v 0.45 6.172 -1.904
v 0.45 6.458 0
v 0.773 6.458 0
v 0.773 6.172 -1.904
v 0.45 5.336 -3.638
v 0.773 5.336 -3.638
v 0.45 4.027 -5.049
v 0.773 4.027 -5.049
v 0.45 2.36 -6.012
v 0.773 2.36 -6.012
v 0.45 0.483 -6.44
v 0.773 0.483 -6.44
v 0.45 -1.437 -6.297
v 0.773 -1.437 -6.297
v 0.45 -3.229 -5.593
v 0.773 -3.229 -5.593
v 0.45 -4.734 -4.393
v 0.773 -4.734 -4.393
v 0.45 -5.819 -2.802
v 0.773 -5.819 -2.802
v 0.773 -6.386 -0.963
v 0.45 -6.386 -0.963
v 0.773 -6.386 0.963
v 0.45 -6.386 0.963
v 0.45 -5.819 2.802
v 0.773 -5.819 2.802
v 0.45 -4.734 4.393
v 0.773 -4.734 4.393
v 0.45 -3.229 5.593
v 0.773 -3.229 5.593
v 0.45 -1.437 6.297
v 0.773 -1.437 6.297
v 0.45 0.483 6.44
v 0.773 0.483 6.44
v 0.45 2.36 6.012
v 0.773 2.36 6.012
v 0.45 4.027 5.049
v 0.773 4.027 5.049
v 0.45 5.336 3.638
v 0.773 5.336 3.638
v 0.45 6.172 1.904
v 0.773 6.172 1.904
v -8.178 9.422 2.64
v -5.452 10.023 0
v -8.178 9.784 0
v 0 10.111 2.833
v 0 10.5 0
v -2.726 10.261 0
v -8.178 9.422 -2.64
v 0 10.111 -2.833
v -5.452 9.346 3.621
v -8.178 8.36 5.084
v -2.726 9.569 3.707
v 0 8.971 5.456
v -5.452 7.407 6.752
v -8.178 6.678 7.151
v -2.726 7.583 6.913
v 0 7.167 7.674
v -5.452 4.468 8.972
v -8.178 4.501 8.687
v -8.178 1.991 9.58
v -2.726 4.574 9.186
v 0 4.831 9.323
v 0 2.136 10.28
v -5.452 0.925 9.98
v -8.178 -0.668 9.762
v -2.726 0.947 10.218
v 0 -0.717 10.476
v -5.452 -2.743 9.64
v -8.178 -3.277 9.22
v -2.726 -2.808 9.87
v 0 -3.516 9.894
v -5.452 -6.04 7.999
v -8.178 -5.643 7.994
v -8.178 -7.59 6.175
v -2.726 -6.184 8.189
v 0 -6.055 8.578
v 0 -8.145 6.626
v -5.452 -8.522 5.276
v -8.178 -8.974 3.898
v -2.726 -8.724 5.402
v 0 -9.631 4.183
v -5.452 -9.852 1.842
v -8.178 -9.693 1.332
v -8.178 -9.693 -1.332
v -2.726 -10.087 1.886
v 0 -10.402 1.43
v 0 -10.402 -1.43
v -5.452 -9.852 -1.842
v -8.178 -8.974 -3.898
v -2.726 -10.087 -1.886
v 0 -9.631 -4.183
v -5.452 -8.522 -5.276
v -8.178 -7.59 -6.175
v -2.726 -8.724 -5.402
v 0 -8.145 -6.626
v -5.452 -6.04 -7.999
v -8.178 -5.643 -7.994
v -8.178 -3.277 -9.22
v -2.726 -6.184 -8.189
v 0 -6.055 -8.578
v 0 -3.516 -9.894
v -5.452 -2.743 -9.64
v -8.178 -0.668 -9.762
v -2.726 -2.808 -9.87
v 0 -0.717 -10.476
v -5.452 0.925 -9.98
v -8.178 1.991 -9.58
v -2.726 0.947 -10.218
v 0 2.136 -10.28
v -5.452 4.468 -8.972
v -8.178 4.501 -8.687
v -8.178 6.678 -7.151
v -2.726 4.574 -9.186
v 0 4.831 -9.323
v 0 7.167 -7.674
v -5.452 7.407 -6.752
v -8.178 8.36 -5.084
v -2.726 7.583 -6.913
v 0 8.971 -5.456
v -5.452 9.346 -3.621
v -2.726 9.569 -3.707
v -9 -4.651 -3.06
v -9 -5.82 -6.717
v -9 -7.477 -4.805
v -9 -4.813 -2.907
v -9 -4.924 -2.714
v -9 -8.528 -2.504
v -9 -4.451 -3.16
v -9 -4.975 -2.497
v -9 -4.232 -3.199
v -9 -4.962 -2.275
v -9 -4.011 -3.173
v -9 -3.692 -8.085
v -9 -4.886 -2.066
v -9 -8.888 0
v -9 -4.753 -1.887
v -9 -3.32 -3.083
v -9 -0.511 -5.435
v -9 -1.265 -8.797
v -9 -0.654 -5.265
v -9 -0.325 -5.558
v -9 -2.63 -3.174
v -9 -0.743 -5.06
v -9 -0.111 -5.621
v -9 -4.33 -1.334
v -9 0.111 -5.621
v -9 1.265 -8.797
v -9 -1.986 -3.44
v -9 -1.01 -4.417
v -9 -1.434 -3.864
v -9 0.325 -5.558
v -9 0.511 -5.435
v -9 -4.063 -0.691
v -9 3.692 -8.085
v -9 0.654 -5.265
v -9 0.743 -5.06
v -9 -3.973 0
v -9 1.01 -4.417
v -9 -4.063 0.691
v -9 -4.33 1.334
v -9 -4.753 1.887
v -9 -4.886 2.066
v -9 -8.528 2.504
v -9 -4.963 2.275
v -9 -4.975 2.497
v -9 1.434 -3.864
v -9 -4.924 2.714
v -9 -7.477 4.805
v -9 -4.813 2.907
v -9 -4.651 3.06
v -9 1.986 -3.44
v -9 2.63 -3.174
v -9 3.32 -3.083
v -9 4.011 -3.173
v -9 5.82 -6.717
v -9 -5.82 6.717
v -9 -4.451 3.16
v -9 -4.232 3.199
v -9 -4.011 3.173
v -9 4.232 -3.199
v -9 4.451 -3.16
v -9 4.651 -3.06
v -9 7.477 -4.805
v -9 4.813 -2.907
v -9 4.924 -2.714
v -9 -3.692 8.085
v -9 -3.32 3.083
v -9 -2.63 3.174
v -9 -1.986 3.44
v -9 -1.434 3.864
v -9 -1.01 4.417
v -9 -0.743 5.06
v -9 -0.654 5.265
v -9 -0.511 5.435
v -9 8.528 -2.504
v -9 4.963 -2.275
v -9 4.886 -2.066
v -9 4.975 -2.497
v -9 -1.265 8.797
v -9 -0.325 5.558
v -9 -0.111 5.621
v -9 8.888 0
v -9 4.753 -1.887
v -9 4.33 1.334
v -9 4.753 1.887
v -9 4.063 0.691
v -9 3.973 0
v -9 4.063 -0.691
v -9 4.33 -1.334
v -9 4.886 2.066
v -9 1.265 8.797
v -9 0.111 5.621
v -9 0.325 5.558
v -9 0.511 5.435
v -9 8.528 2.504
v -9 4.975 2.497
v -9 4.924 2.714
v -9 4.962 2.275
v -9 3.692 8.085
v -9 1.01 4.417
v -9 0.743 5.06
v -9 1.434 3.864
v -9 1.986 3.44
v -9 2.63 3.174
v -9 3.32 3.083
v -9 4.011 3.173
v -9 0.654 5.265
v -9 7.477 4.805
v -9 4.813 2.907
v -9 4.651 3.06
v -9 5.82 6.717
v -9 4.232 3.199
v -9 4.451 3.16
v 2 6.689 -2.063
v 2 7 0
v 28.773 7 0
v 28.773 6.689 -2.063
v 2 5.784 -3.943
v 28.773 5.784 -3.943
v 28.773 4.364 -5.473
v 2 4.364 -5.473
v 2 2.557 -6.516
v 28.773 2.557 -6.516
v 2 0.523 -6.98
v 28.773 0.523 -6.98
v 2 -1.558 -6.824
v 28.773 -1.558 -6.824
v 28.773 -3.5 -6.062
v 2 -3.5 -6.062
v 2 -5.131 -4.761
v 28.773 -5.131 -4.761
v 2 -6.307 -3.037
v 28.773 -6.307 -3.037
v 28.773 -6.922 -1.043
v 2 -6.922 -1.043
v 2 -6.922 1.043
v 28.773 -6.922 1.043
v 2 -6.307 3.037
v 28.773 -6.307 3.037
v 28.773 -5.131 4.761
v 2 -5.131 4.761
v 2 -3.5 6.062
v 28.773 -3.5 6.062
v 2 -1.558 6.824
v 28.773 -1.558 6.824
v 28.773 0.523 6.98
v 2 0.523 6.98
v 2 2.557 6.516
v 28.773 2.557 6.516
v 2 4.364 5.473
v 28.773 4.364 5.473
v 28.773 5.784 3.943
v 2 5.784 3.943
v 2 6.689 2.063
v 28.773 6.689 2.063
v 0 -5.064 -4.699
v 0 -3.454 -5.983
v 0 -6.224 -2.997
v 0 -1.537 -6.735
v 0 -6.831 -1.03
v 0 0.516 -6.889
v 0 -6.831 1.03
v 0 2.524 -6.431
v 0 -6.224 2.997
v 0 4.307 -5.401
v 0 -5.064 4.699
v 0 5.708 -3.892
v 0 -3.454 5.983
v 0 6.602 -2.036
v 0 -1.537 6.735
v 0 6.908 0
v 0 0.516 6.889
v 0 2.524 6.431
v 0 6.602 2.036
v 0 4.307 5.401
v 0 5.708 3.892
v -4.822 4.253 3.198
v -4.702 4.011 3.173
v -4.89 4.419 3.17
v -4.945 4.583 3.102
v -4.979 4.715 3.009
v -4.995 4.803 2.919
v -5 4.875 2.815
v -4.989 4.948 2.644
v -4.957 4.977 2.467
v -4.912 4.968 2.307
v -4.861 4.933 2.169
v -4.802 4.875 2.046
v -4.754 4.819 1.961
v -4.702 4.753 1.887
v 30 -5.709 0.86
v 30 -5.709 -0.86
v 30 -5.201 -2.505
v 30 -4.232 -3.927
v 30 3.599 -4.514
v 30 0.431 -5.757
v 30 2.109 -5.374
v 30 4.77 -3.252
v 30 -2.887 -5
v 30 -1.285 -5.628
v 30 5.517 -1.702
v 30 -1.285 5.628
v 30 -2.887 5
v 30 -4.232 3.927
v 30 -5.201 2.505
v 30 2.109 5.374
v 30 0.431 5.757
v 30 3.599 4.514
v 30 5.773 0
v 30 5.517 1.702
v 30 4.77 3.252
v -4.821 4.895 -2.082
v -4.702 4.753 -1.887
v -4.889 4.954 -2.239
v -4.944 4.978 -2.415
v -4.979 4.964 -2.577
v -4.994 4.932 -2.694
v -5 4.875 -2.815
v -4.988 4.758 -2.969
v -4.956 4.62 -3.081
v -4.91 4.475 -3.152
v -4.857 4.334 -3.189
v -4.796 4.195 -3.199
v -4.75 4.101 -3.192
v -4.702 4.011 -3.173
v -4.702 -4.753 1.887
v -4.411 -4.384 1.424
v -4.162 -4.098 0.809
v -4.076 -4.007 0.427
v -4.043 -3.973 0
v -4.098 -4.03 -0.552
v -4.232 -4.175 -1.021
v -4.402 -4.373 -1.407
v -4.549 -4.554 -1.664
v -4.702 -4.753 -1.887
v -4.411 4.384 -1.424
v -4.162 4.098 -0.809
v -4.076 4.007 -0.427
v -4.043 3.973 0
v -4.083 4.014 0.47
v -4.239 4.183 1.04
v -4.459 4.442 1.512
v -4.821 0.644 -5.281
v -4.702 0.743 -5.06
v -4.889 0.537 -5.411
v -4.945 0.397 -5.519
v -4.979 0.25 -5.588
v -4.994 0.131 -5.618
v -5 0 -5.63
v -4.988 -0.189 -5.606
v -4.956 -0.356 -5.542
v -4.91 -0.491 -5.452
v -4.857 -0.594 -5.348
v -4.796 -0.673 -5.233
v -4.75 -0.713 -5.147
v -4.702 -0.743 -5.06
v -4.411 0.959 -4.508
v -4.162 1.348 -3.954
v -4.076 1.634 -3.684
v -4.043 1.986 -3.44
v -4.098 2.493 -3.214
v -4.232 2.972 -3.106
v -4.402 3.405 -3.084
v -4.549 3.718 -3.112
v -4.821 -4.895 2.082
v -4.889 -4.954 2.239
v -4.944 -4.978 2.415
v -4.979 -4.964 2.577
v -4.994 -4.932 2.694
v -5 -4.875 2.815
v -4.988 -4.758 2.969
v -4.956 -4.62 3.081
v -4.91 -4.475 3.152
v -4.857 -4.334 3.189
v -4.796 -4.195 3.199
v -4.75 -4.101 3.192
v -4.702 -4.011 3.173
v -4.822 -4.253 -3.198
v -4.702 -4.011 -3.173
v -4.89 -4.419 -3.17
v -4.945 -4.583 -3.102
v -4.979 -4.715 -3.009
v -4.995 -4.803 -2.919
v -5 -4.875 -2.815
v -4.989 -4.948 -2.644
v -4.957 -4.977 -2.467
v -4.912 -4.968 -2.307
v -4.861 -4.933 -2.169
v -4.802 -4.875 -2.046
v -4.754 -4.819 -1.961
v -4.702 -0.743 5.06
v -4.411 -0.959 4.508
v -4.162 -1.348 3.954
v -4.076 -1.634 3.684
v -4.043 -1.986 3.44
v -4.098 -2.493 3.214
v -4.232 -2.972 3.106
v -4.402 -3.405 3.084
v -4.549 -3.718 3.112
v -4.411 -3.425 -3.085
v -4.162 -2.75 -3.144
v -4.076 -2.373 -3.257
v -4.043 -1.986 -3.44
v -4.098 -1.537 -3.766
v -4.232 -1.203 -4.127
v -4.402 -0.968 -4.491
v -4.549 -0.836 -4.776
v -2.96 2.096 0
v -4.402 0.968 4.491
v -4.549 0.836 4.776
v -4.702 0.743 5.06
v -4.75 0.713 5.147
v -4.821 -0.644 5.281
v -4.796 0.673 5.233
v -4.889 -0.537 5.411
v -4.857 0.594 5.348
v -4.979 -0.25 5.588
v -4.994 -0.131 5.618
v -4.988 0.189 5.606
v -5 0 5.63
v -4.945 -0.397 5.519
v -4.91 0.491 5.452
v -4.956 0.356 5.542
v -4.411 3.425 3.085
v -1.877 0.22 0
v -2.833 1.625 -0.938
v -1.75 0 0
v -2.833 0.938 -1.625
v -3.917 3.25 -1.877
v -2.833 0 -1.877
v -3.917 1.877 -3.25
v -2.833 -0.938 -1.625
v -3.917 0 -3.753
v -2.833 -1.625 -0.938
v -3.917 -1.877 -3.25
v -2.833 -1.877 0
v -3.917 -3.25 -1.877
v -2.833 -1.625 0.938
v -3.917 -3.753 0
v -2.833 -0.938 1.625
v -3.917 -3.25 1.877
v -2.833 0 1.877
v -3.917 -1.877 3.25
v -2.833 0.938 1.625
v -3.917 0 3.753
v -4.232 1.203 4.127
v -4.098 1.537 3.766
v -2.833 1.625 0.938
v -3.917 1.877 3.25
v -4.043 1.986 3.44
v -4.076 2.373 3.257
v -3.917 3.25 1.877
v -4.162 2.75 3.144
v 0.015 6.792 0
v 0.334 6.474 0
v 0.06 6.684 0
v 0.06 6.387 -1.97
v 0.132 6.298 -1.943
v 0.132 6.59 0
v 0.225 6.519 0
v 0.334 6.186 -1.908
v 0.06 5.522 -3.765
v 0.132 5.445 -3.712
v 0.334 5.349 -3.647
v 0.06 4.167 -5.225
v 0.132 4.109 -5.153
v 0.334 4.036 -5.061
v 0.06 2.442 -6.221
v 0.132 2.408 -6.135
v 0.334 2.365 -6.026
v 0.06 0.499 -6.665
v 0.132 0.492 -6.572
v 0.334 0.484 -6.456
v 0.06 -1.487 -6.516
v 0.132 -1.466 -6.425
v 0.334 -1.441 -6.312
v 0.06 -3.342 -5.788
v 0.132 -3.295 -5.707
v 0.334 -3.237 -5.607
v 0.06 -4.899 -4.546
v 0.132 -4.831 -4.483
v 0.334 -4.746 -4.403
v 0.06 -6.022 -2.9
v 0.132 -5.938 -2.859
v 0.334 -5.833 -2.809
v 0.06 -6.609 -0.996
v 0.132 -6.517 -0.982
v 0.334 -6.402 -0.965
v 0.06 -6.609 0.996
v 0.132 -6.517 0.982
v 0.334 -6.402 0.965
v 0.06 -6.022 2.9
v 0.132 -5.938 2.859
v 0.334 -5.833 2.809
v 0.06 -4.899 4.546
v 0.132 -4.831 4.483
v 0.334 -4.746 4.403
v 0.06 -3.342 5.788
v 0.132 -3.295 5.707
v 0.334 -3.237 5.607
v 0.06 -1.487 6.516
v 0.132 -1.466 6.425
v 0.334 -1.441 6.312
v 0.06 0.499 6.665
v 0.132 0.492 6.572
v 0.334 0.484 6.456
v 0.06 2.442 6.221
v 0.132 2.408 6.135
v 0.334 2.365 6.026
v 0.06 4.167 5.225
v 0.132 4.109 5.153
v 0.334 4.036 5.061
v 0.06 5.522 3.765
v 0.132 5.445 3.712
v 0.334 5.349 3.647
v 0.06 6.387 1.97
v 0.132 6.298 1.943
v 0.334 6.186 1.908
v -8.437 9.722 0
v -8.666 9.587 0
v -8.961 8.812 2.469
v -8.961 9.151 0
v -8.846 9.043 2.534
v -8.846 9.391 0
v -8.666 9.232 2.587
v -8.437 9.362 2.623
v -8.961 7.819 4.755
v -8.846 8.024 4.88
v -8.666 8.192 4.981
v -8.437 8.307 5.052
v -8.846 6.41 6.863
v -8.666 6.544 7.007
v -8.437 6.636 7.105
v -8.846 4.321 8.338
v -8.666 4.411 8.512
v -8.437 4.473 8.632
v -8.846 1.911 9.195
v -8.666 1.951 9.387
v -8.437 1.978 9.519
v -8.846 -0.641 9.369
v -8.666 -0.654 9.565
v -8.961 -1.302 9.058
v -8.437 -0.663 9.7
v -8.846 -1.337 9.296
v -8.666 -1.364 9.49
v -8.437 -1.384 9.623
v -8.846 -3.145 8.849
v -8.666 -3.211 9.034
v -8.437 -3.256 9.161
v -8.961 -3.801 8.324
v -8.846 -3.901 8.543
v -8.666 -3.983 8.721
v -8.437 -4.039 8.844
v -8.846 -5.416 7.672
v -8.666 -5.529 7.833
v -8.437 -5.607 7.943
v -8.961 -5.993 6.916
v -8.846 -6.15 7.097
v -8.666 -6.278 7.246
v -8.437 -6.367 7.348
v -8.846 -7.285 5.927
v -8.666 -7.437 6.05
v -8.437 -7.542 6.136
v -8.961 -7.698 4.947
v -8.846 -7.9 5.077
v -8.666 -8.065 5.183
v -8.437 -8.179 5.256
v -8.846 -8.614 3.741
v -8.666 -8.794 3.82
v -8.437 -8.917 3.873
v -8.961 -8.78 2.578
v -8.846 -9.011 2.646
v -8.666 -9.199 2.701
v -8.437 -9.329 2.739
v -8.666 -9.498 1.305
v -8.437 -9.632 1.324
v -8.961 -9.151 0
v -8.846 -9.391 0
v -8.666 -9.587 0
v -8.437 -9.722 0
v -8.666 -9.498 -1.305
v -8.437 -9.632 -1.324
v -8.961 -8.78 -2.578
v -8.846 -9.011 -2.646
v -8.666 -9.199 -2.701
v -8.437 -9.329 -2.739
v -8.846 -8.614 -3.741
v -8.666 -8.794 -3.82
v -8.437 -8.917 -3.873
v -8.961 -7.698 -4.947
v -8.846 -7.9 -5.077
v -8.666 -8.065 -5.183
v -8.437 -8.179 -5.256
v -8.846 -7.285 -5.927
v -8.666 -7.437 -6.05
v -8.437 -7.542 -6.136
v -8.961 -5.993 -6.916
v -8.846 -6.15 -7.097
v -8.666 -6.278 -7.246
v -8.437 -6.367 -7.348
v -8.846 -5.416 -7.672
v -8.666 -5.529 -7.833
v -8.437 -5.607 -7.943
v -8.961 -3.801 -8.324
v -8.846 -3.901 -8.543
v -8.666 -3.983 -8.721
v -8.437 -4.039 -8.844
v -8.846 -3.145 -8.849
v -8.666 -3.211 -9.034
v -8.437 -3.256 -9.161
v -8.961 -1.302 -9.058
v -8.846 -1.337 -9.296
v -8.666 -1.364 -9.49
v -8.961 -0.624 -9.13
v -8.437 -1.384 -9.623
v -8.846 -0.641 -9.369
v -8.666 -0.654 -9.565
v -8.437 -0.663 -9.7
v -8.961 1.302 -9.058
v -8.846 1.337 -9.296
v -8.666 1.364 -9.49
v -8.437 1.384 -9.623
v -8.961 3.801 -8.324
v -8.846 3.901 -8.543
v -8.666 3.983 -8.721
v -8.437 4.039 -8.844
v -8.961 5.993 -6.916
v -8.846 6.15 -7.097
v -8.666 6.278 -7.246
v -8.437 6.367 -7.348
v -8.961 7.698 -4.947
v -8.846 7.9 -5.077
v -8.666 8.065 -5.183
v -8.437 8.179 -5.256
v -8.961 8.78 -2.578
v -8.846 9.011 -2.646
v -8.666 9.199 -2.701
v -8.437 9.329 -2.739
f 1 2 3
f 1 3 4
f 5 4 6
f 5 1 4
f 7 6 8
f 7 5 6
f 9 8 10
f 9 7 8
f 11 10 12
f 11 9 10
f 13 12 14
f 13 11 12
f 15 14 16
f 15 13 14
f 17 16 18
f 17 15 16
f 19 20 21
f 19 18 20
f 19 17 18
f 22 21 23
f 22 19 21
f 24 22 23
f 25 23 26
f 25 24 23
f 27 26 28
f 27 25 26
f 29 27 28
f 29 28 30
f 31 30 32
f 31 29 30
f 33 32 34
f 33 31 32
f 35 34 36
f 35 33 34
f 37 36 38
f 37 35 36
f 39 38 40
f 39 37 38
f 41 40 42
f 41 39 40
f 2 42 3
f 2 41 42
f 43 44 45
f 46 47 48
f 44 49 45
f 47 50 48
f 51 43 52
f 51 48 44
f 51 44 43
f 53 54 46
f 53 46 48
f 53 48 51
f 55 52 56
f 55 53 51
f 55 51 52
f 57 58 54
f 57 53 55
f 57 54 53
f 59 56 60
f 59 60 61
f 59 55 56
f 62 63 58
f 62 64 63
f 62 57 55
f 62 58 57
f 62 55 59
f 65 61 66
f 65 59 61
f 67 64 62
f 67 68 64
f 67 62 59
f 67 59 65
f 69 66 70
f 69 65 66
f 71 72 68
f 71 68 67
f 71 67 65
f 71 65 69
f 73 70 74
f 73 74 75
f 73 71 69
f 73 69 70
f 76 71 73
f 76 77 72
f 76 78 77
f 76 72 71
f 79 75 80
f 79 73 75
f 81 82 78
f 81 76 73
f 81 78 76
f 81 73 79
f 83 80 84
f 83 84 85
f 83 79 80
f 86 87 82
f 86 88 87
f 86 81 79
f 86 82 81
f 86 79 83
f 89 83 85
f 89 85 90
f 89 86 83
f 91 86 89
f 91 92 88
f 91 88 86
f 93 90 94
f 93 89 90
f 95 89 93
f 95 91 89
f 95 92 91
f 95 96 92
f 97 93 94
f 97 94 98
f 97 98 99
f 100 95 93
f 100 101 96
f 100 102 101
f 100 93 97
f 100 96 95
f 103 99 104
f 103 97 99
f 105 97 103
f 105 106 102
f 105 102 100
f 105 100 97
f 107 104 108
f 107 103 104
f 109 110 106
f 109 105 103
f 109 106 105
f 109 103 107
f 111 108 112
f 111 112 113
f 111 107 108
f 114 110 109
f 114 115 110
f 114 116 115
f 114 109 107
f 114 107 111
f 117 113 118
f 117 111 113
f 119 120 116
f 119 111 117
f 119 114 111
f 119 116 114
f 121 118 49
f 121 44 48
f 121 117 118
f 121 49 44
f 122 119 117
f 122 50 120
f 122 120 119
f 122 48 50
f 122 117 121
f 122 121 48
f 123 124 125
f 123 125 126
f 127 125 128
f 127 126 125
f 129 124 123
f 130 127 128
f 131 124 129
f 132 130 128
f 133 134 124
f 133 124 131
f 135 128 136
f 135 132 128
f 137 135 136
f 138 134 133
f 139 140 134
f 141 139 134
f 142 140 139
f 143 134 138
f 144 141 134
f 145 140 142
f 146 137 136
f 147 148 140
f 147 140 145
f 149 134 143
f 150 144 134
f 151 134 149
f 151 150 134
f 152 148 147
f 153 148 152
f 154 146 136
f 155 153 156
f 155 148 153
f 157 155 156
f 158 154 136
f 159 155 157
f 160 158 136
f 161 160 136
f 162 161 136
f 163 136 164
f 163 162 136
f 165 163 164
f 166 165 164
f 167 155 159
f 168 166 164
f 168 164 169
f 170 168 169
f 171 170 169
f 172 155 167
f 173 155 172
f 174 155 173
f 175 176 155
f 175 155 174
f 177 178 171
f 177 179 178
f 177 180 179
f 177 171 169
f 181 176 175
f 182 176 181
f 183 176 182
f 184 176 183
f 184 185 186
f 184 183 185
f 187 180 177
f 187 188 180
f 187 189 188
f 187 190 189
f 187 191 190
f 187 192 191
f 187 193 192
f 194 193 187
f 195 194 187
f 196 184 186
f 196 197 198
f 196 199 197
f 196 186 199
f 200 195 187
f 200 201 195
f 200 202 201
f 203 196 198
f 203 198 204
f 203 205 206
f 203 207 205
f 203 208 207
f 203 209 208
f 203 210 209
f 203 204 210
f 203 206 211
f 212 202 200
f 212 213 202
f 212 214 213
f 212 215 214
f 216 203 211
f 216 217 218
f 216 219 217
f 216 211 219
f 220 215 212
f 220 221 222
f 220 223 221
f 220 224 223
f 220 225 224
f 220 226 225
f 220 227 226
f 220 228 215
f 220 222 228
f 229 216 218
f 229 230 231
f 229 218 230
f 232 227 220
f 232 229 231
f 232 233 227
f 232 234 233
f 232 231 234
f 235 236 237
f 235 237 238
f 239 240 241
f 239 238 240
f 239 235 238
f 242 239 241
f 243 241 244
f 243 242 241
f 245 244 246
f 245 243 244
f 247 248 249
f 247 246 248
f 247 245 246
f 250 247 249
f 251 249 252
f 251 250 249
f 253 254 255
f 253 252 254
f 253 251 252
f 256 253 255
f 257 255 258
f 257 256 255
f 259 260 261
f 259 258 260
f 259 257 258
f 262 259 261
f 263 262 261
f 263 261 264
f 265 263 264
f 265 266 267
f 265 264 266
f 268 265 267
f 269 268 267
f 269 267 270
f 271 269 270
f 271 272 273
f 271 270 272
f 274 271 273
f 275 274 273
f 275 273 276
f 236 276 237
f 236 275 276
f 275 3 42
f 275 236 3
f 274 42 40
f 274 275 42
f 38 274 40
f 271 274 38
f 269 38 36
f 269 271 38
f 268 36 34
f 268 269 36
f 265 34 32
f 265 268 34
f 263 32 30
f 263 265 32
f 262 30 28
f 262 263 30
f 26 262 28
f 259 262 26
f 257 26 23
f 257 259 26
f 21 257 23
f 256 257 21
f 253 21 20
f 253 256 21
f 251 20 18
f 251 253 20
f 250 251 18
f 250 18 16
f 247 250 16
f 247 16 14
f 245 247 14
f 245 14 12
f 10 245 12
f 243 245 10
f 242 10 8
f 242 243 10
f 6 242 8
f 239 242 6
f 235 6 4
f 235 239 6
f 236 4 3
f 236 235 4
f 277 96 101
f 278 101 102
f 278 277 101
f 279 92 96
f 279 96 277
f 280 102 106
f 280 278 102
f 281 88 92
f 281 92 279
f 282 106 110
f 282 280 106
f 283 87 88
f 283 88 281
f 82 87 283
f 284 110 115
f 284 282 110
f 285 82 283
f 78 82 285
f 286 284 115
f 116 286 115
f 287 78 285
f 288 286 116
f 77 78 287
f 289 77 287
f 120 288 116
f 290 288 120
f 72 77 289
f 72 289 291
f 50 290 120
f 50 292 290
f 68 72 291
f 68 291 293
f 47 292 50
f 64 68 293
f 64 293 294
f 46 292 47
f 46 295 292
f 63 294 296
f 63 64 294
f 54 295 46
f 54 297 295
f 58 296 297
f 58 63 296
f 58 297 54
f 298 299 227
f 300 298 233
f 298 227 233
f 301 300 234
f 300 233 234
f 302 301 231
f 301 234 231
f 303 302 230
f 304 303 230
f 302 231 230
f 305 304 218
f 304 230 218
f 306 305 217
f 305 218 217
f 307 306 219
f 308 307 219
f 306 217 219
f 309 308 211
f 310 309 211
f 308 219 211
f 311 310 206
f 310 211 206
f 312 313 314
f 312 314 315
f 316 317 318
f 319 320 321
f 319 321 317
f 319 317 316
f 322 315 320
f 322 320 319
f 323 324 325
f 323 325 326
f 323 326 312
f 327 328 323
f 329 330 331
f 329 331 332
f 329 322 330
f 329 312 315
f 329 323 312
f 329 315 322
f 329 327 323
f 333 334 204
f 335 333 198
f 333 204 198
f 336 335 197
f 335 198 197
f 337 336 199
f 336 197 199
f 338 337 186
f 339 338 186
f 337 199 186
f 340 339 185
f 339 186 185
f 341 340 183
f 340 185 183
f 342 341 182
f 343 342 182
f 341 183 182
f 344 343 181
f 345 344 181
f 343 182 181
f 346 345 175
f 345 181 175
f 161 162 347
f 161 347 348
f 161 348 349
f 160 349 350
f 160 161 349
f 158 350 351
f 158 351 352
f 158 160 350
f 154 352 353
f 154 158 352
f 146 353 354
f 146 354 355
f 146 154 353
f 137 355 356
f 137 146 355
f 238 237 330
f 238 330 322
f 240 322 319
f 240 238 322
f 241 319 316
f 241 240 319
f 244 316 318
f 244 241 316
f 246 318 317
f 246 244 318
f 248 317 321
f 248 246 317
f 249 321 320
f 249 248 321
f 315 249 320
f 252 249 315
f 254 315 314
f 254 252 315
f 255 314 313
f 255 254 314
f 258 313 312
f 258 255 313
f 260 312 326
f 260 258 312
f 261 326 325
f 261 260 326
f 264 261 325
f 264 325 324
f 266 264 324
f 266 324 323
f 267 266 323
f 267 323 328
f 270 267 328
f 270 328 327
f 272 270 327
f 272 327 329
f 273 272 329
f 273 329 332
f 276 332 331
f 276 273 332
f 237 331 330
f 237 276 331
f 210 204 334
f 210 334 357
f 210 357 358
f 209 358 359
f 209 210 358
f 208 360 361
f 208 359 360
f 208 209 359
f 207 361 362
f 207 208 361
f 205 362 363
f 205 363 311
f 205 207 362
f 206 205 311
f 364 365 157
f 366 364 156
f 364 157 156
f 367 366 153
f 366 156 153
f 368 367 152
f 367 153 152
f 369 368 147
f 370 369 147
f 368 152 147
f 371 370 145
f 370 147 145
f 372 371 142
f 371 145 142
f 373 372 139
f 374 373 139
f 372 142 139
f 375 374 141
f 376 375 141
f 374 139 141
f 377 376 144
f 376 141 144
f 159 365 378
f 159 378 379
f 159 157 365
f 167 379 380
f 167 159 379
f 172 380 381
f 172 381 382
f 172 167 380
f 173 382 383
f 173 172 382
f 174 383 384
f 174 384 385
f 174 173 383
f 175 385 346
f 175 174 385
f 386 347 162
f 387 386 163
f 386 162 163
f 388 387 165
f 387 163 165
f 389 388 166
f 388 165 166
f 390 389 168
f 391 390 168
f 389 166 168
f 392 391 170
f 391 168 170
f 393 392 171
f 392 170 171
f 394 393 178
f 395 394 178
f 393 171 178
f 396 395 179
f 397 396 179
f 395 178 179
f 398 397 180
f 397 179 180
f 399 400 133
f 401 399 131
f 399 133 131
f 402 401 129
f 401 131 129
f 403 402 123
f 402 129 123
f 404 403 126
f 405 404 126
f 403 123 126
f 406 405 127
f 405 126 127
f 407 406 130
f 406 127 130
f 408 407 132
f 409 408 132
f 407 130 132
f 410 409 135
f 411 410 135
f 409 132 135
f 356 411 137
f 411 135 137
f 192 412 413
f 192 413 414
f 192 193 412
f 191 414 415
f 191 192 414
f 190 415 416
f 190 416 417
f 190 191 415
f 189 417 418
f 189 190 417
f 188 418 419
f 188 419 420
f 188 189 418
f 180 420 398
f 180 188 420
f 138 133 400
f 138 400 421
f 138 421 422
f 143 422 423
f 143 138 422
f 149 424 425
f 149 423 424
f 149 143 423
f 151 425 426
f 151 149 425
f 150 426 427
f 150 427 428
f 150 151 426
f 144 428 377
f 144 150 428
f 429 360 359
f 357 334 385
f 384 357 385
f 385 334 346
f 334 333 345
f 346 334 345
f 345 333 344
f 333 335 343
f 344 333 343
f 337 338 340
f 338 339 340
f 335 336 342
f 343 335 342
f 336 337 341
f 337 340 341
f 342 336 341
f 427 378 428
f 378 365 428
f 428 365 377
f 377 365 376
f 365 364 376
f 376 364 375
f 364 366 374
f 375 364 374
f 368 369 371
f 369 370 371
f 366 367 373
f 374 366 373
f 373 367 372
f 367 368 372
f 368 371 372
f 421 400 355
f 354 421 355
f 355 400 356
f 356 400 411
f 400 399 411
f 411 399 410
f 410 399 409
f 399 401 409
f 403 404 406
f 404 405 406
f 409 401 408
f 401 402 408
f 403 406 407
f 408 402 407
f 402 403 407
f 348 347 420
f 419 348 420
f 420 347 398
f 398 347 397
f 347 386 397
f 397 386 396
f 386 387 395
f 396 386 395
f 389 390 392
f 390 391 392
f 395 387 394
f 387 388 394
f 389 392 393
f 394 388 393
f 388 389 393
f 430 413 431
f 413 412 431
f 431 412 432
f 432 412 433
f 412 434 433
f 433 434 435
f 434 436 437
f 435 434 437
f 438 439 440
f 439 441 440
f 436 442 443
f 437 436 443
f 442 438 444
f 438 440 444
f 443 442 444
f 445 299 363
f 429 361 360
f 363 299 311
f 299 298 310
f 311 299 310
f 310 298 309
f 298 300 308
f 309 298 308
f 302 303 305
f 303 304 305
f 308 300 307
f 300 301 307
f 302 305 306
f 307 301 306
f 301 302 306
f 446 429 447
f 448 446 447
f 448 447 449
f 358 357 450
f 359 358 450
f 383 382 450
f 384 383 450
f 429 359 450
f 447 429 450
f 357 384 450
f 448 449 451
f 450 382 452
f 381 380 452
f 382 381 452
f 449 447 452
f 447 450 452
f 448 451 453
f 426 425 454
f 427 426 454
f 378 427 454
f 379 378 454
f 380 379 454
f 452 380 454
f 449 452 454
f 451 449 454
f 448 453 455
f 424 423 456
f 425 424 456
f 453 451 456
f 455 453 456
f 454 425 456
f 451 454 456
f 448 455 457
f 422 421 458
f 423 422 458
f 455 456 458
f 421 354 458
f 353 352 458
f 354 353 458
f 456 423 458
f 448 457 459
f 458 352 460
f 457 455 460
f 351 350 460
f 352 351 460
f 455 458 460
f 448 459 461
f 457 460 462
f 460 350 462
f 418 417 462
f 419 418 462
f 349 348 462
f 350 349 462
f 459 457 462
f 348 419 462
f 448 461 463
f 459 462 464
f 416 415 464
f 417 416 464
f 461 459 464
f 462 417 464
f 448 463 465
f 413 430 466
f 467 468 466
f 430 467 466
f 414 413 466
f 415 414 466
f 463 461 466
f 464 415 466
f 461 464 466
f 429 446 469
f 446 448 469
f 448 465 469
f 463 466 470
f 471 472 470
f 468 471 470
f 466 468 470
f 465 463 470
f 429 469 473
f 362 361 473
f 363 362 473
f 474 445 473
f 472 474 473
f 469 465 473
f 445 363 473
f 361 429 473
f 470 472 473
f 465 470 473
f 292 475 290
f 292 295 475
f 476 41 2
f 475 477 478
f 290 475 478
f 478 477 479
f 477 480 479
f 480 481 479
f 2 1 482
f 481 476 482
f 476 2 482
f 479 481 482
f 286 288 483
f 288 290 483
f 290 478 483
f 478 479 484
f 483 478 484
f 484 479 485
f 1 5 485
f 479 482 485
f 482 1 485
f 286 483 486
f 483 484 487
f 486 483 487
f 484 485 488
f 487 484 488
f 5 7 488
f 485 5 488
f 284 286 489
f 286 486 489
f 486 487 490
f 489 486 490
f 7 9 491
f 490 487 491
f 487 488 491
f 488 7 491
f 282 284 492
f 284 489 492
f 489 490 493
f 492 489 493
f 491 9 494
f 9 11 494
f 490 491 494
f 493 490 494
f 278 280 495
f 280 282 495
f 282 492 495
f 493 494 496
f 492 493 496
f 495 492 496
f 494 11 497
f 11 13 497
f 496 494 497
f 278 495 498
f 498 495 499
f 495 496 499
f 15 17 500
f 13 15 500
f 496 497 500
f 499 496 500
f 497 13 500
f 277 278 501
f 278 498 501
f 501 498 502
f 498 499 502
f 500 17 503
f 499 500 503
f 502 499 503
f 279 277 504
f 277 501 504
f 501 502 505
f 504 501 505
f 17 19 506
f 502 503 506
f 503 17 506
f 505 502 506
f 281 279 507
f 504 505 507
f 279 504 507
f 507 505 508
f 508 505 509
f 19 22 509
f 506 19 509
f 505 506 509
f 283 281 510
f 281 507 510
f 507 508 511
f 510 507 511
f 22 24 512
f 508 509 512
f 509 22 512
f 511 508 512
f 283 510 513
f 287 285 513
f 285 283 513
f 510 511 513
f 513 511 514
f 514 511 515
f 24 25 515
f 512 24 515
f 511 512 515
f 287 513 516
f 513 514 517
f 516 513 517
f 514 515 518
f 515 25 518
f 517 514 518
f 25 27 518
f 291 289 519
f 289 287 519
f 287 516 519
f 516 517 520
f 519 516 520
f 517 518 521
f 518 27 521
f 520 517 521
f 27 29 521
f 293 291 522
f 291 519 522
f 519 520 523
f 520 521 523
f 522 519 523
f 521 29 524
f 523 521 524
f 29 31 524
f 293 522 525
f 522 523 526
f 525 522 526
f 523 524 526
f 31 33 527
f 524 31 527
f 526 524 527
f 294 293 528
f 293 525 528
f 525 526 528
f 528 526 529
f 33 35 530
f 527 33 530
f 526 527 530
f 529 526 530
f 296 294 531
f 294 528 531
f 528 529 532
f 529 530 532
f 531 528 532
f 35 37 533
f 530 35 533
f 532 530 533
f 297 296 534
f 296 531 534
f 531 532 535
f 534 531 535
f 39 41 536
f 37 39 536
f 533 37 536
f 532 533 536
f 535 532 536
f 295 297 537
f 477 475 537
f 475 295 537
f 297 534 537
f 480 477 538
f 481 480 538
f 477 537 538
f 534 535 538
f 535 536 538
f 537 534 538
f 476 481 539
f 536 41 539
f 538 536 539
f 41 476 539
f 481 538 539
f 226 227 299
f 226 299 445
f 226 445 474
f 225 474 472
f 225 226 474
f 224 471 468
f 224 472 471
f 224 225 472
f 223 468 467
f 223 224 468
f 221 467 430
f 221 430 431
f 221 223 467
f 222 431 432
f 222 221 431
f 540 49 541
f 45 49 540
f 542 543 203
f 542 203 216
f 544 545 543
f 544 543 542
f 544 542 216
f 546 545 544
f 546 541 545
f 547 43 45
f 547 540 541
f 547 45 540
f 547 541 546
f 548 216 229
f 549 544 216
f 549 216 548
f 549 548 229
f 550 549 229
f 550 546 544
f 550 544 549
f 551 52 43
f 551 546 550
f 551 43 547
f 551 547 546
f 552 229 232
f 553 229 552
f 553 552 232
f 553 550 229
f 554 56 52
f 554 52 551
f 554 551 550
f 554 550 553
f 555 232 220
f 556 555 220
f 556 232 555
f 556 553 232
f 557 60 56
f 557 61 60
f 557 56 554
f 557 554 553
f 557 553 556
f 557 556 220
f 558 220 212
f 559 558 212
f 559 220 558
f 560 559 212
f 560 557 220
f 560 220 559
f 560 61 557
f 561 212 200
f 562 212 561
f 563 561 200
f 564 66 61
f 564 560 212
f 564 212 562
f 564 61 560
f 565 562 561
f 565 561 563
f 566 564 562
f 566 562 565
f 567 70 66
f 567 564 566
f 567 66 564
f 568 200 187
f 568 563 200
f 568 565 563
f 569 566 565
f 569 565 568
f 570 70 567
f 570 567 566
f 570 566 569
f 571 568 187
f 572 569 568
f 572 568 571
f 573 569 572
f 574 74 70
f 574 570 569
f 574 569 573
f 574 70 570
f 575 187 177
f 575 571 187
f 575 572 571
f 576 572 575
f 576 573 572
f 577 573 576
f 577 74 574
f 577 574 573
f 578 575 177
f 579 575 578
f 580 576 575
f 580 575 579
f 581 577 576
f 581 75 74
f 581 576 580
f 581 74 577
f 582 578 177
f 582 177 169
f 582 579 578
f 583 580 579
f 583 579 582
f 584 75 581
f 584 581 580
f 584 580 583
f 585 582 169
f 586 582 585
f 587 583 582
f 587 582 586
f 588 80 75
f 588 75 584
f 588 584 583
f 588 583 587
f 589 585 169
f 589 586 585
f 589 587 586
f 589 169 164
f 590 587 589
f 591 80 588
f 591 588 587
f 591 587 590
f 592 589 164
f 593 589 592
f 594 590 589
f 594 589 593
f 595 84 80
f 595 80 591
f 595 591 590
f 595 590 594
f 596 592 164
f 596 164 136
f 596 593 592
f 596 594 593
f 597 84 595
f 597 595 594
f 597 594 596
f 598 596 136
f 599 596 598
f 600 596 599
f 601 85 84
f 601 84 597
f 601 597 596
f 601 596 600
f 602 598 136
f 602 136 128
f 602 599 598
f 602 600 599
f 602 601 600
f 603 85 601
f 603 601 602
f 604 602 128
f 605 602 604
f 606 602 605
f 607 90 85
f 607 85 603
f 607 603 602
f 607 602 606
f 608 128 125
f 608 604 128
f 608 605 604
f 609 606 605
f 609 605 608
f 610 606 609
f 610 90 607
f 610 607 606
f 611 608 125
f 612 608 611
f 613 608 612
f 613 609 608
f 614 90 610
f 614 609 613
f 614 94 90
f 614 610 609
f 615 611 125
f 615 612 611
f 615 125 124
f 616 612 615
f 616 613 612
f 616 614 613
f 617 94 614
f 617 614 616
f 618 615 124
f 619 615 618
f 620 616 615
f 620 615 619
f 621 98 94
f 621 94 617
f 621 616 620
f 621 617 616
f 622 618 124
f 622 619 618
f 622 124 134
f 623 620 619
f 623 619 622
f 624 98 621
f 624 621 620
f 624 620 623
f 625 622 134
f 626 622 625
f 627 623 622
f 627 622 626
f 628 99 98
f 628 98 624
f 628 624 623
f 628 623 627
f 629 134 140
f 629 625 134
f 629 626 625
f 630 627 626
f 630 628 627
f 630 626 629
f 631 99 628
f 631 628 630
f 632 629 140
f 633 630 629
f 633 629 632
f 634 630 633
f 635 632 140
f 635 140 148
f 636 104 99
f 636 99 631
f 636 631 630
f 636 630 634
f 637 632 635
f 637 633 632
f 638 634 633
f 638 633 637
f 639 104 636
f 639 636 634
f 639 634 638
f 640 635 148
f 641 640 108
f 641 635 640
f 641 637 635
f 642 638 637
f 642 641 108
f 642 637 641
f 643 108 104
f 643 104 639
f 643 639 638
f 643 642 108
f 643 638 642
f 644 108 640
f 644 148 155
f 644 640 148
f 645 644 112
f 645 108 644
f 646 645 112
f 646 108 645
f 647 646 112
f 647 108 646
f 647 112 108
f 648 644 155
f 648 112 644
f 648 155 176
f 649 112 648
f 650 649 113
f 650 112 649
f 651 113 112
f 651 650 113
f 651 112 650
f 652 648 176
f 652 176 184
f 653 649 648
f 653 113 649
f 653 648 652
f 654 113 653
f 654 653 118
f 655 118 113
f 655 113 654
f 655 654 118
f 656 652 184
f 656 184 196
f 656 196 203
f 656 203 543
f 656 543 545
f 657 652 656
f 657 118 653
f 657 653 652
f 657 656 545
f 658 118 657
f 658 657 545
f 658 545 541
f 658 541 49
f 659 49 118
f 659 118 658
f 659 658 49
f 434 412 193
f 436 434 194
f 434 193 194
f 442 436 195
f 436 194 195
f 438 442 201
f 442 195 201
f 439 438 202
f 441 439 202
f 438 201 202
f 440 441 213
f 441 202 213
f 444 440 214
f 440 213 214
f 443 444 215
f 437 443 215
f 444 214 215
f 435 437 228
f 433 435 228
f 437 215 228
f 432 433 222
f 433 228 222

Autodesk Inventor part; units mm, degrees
ref_plane "YZ Plane" through (0, 0, 0) normal (1, 0, 0) x (0, 1, 0)
ref_plane "XZ Plane" through (0, 0, 0) normal (0, 1, 0) x (-1, 0, 0)
sketch "Sketch1" plane through (0, 0, 0) normal (0, 0, 1) x (1, 0, 0)
  line L0 (-1.7498, 0) -> (30, 0)
  line L1 (30, 0) -> (30, 7)
  line L2 (30, 7) -> (2, 7)
  line L3 (2, 7) -> (0.7731, 6.4585)
  line L4 (0.7731, 6.4585) -> (0.45, 6.4585)
  line L5 (0, 6.9085) -> (0, 10.5)
  line L6 (0, 10.5) -> (-9, 10.5)
  line L7 (-9, 10.5) -> (-9, 5.6295)
  line L8 (-9, 5.6295) -> (-5, 5.6295)
  line L9 (-5, 5.6295) -> (-1.7498, 0)
  line L10 (-16.8, 0) -> (37.8, 0) projected
  line L11 (0, -2.1) -> (0, 12.6) projected
  line L12 (2, 7) -> (0, 7) construction
  arc A0 (0, 6.9085) -> (0.45, 6.4585) centre (0.45, 6.9085) ccw
  line L13 (0, 10.5) -> (-9, 9.7126)
  point P0 (0, 6.4585)
  dimension "d1" = 28
  dimension "d2" = 1.2269
  dimension "d3" = 9
  dimension "d4" = 4
  dimension "d5" = 60
  dimension "d6" = 14
  dimension "d7" = 12.917
  dimension "d8" = 11.259
  dimension "d9" = 21
  dimension "d20" = 30
  dimension "d34" = 0.45
  dimension "d35" = 5
revolve "Body" add sketch "Sketch1" angle 360 about axis through (-1.7498, 0, 0) along (1, 0, 0)
sketch "Sketch2" plane through (-9, 0, 0) normal (-1, 0, 0) x (0, 0, 1)
  line L0 (0, -14.7) -> (0, 14.7) projected
  line L1 (-14.7, 0) -> (14.7, 0) projected
  circle A0 centre (0, 0) radius 10.5 projected
  circle A1 centre (0, 0) radius 3.9725
  line L2 (0, 0) -> (4.8438, 8.3897) construction
  line L3 (0, 0) -> (8.7121, 5.0299) construction
  circle A2 centre (0, 0) radius 5.6295 projected
  arc A3 (3.1732, 4.0107) -> (1.8868, 4.7534) centre (2.4303, 4.2093) ccw
  arc A4 (5.06, -0.7427) -> (5.06, 0.7427) centre (4.8605, 0) ccw
  arc A5 (3.1732, 4.0107) -> (5.06, 0.7427) centre (5.7525, 3.3212) ccw
  arc A6 (-1.8868, 4.7534) -> (-3.1732, 4.0107) centre (-2.4303, 4.2093) ccw
  arc A7 (-5.06, 0.7427) -> (-5.06, -0.7427) centre (-4.8605, 0) ccw
  arc A8 (-5.06, 0.7427) -> (-3.1732, 4.0107) centre (-5.7525, 3.3212) ccw
  arc A9 (1.8868, -4.7534) -> (3.1732, -4.0107) centre (2.4303, -4.2093) ccw
  arc A10 (5.06, -0.7427) -> (5.06, 0.7427) centre (4.8605, 0) ccw
  arc A11 (5.06, -0.7427) -> (3.1732, -4.0107) centre (5.7525, -3.3212) ccw
  arc A12 (-3.1732, -4.0107) -> (-1.8868, -4.7534) centre (-2.4303, -4.2093) ccw
  arc A13 (-3.1732, -4.0107) -> (-5.06, -0.7427) centre (-5.7525, -3.3212) ccw
  arc A14 (-5.06, 0.7427) -> (-5.06, -0.7427) centre (-4.8605, 0) ccw
  arc A15 (-1.8868, 4.7534) -> (1.8868, 4.7534) centre (0, 6.6424) ccw
  arc A16 (1.8868, -4.7534) -> (-1.8868, -4.7534) centre (0, -6.6424) ccw
  dimension "d38" = 7.945
  dimension "d39" = 30
  dimension "d40" = 60
  dimension "d42" = 0.769
extrude "Slot" add sketch "Sketch2" against normal up to next contours A2 A12 A16 L0 | L0 A16 A9 A2 | A2 A7 A13 A12 | A9 A11 A4 A2 | A2 A6 A8 A7 | A4 A5 A3 A2 | A2 L0 A15 A6 | A2 A3 A15 L0
revolve "Taper" cut sketch "Sketch1" angle 360 about axis through (0, 0, 0) along (1, 0, 0) contours L13 L7 L6
fillet "Fillet1" radius 0.9 1 edges at (-9, -9.7126, 0)
thread "Thread" size "M14x2" designation "M14" class "6g" standard "GB Metric profile" length 28
chamfer "Chamfer1" distance 1.2269 distance2 1.227 1 edges at (30, -7, 0) measured on face at (30, -0.3293, 1.9203)
ref_plane "Work Plane1" through (0, 0, 0) normal (0, 0.5, 0.866) x (1, 0, 0)
equation "\"d1\" = GEL"
equation "\"d2\" = GAL"
equation "\"d3\" = KOH"
equation "\"d4\" = INTI"
equation "\"d6\" = GD"
equation "\"d7\" = BDM"
equation "\"d8\" = E0"
equation "\"d9\" = KOD"
equation "\"d20\" = NLG"
equation "\"d34\" = R"
equation "\"d38\" = SW"
equation "\"d42\" = RRK"
equation "\"d17\" = RR"
equation "\"d13\" = GEL"
equation "\"d15\" = -0.5 * SPD + 0.5 * GD"
equation "\"GD\" = NND"
equation "\"NLG\" = 30"
equation "\"GEL\" = 28"
equation "\"KOD\" = 21"
equation "\"KOH\" = 9"
equation "\"INTI\" = 4"
equation "\"GAL\" = 0.61345 * PTC"
equation "\"GUL\" = 0.61345 * PTC"
equation "\"BDM\" = 12.917"
equation "\"SW\" = 7.945"
equation "\"RR\" = 0.9"
equation "\"SPD\" = NND - 1.2269 * PTC"
equation "\"R\" = 0.45"
equation "\"E0\" = 11.259"
equation "\"RRK\" = 0.769"
equation "\"PHH\" = 0"
equation "\"GD1\" = THREADDIA - 1.2269 * PTC"
equation "\"THREADDIA\" = 14"
equation "\"FAWI\" = 90deg"
equation "\"ANG\" = 120deg"
equation "\"PTC\" = 2"
equation "\"NND\" = 14"
equation "\"TOA\" = 30deg"
equation "\"KEWI\" = 5deg"
properties part number "Screw GB/T 2171.1 M14 x 30" material "Steel, Mild"
